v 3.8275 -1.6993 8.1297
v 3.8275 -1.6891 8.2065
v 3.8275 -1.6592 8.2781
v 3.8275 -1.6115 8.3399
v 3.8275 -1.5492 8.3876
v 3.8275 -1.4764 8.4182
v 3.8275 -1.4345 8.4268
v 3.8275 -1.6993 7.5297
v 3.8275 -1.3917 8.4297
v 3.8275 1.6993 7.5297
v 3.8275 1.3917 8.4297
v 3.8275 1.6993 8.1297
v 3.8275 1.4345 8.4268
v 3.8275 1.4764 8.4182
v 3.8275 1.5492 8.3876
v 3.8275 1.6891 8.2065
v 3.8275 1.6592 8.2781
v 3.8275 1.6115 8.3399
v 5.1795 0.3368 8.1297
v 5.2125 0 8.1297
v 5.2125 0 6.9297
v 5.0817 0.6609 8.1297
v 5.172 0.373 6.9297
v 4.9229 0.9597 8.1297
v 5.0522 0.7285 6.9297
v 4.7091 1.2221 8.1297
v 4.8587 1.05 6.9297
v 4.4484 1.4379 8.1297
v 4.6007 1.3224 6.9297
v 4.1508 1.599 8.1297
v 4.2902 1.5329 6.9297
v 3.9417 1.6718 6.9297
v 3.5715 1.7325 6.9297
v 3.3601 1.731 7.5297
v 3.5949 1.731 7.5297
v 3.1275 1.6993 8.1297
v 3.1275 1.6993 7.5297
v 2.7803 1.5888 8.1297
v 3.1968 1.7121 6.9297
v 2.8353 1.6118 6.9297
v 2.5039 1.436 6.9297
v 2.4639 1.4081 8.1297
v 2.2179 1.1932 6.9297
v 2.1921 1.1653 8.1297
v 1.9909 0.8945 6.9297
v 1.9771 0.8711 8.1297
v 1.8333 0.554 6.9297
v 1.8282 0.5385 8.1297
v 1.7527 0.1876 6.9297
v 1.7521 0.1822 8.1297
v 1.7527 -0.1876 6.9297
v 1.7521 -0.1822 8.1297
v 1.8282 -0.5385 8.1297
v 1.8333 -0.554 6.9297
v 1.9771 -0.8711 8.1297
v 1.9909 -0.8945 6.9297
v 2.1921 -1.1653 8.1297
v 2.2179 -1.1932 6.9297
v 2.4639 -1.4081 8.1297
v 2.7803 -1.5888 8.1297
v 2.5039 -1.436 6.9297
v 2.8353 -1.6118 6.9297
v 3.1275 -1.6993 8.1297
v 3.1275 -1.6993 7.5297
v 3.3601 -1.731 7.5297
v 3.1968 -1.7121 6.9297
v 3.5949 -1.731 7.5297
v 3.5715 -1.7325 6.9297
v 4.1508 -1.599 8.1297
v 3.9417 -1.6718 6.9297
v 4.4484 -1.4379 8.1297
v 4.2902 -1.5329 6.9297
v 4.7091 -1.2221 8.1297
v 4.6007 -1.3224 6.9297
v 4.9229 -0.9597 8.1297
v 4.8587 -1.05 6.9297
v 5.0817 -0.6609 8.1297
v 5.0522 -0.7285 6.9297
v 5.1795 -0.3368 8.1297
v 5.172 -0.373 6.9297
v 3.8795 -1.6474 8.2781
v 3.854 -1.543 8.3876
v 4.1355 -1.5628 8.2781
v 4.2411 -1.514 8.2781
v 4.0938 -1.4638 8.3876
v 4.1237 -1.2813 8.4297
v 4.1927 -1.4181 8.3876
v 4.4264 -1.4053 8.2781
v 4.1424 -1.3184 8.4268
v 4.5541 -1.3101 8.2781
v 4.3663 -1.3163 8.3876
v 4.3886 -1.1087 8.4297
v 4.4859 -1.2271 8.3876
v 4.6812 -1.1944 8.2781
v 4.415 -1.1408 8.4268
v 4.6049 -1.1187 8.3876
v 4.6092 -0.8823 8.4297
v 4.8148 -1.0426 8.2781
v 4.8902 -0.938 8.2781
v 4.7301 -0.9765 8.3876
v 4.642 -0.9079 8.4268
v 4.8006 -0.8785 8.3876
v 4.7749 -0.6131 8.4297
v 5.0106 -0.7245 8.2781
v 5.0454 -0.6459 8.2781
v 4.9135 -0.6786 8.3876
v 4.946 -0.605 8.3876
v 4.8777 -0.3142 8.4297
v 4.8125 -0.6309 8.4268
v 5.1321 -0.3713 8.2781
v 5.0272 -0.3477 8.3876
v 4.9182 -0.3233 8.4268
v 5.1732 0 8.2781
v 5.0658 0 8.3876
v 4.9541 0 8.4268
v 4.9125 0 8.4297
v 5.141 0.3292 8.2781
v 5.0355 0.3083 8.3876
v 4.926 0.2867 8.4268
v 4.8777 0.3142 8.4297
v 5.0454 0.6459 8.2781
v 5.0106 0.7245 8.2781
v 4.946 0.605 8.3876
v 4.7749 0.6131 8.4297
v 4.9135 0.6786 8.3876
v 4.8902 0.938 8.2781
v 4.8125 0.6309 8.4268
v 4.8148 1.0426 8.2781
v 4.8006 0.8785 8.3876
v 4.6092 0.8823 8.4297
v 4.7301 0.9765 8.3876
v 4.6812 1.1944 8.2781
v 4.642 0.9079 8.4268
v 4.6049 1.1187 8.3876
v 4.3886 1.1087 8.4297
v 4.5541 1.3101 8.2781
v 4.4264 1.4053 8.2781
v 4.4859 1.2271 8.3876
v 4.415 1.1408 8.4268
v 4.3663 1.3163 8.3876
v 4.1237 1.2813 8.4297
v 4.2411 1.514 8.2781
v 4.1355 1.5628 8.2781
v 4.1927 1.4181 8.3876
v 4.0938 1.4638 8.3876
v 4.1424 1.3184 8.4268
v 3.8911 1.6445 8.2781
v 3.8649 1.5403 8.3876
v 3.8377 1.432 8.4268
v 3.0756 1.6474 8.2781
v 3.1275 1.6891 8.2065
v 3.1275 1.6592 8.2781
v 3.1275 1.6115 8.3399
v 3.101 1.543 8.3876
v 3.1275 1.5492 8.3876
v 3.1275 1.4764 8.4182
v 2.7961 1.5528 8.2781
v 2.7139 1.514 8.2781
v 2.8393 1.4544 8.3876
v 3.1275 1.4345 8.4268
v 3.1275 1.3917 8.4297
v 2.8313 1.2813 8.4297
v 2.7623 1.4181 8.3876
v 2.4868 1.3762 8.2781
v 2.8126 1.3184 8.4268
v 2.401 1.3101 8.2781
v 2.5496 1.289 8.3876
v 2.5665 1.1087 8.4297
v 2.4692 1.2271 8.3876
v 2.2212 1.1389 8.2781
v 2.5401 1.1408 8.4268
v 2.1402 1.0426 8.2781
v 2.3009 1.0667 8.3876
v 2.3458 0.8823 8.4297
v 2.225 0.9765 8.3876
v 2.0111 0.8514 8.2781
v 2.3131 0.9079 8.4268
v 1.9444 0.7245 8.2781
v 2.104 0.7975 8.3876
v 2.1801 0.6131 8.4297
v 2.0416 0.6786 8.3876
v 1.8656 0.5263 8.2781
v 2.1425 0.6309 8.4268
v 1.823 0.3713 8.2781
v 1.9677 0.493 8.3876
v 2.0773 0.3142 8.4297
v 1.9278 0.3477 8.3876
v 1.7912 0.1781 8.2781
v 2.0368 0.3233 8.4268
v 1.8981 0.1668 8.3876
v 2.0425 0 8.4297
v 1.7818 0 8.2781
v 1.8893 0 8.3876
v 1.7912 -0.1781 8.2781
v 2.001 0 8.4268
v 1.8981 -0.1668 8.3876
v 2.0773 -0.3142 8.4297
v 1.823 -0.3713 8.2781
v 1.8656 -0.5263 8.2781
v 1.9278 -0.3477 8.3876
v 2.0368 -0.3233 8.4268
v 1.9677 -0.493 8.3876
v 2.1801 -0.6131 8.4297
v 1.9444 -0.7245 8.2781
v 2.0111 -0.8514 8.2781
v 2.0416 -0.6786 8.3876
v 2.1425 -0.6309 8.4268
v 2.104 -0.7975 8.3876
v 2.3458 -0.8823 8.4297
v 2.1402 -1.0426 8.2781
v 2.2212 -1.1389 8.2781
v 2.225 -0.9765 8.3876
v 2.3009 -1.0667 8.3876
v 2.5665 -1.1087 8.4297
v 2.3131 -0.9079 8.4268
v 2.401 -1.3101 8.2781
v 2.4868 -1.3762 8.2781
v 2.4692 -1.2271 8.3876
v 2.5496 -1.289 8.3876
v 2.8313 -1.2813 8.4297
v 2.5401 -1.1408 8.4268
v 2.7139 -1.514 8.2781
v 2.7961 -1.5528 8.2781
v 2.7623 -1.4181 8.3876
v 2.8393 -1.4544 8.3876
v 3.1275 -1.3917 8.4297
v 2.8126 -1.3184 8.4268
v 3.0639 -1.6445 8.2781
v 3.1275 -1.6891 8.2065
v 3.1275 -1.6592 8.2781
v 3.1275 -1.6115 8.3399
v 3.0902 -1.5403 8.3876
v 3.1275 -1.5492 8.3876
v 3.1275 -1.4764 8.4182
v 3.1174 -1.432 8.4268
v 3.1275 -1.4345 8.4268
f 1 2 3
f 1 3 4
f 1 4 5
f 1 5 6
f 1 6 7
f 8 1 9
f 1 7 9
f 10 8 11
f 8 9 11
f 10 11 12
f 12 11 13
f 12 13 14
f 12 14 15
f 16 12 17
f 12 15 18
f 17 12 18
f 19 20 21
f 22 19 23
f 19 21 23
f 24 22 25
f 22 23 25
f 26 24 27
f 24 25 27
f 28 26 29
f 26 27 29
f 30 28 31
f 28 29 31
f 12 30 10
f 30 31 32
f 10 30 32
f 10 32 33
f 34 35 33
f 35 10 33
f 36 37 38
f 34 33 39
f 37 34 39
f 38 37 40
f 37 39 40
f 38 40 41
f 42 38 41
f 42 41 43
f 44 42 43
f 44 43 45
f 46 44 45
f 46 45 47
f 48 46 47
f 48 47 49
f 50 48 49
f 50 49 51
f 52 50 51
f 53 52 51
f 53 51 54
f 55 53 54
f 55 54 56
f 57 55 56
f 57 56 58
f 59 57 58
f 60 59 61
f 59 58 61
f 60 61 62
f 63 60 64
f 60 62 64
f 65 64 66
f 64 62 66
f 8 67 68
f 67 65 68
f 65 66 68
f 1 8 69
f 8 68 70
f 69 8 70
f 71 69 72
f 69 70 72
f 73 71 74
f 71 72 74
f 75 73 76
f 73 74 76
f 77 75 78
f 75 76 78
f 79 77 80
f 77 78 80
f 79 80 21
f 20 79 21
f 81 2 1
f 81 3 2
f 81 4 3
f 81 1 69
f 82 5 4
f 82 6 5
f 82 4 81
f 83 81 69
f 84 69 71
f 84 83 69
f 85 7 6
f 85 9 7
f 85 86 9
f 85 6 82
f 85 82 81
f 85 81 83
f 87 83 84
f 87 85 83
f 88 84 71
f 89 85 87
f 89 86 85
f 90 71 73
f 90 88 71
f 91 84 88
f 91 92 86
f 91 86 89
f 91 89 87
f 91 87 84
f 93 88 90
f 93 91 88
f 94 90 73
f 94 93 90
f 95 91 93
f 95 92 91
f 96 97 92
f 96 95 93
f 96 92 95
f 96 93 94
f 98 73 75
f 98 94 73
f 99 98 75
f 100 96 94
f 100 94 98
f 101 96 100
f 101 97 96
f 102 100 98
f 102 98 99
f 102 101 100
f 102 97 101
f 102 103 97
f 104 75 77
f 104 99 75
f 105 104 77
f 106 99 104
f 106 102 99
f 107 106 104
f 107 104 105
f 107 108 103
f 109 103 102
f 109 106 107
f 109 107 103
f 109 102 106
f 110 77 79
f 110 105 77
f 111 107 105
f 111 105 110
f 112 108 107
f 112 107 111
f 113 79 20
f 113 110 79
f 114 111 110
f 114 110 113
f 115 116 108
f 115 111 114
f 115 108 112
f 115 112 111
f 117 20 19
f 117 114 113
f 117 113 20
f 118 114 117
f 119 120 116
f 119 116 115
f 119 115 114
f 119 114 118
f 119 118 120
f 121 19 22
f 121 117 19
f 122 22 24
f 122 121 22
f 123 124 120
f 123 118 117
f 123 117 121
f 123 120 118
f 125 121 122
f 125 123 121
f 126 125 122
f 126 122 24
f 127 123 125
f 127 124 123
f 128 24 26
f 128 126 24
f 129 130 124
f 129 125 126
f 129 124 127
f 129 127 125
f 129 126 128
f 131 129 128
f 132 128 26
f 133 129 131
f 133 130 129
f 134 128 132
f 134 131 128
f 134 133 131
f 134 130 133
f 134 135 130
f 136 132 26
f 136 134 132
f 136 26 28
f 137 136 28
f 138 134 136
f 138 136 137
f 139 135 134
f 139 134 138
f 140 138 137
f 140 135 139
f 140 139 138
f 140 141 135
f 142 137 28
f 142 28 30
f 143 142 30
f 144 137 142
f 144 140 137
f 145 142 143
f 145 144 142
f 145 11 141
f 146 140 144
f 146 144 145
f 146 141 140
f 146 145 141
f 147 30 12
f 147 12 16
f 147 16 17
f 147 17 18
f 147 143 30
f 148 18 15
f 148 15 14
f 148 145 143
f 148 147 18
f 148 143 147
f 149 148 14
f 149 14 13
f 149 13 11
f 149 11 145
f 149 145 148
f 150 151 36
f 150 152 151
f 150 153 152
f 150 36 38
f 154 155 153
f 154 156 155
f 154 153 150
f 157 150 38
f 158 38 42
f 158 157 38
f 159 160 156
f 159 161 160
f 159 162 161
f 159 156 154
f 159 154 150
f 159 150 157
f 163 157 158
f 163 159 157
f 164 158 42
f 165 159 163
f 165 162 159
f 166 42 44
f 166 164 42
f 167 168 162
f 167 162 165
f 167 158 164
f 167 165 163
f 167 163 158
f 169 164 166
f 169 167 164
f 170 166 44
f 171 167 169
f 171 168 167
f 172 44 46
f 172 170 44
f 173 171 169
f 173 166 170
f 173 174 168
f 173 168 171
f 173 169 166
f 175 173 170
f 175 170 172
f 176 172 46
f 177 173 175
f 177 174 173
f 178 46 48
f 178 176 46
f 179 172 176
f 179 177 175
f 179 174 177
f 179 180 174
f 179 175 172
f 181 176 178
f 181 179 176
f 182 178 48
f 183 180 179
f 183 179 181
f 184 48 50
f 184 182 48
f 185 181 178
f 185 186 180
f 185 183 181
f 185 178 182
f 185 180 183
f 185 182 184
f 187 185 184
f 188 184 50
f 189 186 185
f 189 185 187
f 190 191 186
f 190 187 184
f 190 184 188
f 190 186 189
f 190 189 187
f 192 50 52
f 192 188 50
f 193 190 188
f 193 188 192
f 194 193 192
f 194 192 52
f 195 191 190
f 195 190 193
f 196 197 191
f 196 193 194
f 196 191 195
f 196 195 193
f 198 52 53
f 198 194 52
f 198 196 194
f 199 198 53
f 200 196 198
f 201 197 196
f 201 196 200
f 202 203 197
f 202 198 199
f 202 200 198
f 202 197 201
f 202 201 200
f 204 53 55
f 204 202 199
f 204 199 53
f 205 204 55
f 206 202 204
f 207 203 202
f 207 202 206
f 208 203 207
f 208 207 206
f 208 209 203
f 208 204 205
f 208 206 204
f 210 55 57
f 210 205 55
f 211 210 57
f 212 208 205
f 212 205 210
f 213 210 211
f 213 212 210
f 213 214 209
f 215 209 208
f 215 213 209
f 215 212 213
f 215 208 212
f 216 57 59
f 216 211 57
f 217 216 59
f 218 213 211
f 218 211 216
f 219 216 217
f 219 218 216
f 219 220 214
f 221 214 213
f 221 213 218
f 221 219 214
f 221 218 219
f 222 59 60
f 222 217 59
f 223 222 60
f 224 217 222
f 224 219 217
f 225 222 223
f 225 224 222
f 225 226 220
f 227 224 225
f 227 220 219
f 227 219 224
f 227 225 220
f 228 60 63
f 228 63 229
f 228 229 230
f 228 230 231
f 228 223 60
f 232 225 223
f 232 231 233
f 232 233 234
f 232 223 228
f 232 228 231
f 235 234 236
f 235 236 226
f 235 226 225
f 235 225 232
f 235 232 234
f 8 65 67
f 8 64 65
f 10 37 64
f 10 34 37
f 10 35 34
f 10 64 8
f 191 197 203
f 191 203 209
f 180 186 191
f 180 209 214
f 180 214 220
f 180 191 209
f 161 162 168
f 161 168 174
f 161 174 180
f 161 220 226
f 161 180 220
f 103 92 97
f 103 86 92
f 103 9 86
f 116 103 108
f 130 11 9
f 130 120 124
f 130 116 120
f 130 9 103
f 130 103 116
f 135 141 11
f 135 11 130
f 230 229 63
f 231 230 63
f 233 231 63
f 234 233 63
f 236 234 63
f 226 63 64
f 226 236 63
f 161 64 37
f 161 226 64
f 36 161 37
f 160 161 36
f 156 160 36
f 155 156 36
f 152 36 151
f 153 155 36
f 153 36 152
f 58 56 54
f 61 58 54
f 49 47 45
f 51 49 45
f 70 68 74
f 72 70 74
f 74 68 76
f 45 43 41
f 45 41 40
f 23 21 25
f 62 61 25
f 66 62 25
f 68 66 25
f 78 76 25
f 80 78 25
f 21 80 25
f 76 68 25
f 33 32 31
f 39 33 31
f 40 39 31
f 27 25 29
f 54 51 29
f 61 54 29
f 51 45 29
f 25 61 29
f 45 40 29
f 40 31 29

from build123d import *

# Parameters (mm, degrees)
SKETCH017_R     = 1.735
PAD008_DEPTH    = 1.5
SKETCH018_W     = 0.7
SKETCH018_H     = 4
POCKET007_DEPTH = 0.9
FILLET007_R     = 0.3


with BuildPart() as part:
    # Sketch017 → Pad008 (new body)
    with BuildSketch(Plane.XY):
        Circle(SKETCH017_R)
    extrude(amount=PAD008_DEPTH)

    # Sketch018 (on Face3 of Pad008) → Pocket007 (cut)
    with BuildSketch(Plane.XY.offset(1.5)):
        Rectangle(SKETCH018_W, SKETCH018_H)
    extrude(amount=-POCKET007_DEPTH, mode=Mode.SUBTRACT)

    # Fillet007
    fillet007_edges = [part.edges().sort_by_distance(p)[0] for p in [
        (1.344893, -1.096124, 1.5),
        (-1.735, 0, 1.5),
    ]]
    fillet(fillet007_edges, radius=FILLET007_R)


with BuildPart() as part_1:
    # Body006 placement: moved
    add(part.part.moved(Location((3.477525, 0, 6.9297))))


solid = part_1.part
